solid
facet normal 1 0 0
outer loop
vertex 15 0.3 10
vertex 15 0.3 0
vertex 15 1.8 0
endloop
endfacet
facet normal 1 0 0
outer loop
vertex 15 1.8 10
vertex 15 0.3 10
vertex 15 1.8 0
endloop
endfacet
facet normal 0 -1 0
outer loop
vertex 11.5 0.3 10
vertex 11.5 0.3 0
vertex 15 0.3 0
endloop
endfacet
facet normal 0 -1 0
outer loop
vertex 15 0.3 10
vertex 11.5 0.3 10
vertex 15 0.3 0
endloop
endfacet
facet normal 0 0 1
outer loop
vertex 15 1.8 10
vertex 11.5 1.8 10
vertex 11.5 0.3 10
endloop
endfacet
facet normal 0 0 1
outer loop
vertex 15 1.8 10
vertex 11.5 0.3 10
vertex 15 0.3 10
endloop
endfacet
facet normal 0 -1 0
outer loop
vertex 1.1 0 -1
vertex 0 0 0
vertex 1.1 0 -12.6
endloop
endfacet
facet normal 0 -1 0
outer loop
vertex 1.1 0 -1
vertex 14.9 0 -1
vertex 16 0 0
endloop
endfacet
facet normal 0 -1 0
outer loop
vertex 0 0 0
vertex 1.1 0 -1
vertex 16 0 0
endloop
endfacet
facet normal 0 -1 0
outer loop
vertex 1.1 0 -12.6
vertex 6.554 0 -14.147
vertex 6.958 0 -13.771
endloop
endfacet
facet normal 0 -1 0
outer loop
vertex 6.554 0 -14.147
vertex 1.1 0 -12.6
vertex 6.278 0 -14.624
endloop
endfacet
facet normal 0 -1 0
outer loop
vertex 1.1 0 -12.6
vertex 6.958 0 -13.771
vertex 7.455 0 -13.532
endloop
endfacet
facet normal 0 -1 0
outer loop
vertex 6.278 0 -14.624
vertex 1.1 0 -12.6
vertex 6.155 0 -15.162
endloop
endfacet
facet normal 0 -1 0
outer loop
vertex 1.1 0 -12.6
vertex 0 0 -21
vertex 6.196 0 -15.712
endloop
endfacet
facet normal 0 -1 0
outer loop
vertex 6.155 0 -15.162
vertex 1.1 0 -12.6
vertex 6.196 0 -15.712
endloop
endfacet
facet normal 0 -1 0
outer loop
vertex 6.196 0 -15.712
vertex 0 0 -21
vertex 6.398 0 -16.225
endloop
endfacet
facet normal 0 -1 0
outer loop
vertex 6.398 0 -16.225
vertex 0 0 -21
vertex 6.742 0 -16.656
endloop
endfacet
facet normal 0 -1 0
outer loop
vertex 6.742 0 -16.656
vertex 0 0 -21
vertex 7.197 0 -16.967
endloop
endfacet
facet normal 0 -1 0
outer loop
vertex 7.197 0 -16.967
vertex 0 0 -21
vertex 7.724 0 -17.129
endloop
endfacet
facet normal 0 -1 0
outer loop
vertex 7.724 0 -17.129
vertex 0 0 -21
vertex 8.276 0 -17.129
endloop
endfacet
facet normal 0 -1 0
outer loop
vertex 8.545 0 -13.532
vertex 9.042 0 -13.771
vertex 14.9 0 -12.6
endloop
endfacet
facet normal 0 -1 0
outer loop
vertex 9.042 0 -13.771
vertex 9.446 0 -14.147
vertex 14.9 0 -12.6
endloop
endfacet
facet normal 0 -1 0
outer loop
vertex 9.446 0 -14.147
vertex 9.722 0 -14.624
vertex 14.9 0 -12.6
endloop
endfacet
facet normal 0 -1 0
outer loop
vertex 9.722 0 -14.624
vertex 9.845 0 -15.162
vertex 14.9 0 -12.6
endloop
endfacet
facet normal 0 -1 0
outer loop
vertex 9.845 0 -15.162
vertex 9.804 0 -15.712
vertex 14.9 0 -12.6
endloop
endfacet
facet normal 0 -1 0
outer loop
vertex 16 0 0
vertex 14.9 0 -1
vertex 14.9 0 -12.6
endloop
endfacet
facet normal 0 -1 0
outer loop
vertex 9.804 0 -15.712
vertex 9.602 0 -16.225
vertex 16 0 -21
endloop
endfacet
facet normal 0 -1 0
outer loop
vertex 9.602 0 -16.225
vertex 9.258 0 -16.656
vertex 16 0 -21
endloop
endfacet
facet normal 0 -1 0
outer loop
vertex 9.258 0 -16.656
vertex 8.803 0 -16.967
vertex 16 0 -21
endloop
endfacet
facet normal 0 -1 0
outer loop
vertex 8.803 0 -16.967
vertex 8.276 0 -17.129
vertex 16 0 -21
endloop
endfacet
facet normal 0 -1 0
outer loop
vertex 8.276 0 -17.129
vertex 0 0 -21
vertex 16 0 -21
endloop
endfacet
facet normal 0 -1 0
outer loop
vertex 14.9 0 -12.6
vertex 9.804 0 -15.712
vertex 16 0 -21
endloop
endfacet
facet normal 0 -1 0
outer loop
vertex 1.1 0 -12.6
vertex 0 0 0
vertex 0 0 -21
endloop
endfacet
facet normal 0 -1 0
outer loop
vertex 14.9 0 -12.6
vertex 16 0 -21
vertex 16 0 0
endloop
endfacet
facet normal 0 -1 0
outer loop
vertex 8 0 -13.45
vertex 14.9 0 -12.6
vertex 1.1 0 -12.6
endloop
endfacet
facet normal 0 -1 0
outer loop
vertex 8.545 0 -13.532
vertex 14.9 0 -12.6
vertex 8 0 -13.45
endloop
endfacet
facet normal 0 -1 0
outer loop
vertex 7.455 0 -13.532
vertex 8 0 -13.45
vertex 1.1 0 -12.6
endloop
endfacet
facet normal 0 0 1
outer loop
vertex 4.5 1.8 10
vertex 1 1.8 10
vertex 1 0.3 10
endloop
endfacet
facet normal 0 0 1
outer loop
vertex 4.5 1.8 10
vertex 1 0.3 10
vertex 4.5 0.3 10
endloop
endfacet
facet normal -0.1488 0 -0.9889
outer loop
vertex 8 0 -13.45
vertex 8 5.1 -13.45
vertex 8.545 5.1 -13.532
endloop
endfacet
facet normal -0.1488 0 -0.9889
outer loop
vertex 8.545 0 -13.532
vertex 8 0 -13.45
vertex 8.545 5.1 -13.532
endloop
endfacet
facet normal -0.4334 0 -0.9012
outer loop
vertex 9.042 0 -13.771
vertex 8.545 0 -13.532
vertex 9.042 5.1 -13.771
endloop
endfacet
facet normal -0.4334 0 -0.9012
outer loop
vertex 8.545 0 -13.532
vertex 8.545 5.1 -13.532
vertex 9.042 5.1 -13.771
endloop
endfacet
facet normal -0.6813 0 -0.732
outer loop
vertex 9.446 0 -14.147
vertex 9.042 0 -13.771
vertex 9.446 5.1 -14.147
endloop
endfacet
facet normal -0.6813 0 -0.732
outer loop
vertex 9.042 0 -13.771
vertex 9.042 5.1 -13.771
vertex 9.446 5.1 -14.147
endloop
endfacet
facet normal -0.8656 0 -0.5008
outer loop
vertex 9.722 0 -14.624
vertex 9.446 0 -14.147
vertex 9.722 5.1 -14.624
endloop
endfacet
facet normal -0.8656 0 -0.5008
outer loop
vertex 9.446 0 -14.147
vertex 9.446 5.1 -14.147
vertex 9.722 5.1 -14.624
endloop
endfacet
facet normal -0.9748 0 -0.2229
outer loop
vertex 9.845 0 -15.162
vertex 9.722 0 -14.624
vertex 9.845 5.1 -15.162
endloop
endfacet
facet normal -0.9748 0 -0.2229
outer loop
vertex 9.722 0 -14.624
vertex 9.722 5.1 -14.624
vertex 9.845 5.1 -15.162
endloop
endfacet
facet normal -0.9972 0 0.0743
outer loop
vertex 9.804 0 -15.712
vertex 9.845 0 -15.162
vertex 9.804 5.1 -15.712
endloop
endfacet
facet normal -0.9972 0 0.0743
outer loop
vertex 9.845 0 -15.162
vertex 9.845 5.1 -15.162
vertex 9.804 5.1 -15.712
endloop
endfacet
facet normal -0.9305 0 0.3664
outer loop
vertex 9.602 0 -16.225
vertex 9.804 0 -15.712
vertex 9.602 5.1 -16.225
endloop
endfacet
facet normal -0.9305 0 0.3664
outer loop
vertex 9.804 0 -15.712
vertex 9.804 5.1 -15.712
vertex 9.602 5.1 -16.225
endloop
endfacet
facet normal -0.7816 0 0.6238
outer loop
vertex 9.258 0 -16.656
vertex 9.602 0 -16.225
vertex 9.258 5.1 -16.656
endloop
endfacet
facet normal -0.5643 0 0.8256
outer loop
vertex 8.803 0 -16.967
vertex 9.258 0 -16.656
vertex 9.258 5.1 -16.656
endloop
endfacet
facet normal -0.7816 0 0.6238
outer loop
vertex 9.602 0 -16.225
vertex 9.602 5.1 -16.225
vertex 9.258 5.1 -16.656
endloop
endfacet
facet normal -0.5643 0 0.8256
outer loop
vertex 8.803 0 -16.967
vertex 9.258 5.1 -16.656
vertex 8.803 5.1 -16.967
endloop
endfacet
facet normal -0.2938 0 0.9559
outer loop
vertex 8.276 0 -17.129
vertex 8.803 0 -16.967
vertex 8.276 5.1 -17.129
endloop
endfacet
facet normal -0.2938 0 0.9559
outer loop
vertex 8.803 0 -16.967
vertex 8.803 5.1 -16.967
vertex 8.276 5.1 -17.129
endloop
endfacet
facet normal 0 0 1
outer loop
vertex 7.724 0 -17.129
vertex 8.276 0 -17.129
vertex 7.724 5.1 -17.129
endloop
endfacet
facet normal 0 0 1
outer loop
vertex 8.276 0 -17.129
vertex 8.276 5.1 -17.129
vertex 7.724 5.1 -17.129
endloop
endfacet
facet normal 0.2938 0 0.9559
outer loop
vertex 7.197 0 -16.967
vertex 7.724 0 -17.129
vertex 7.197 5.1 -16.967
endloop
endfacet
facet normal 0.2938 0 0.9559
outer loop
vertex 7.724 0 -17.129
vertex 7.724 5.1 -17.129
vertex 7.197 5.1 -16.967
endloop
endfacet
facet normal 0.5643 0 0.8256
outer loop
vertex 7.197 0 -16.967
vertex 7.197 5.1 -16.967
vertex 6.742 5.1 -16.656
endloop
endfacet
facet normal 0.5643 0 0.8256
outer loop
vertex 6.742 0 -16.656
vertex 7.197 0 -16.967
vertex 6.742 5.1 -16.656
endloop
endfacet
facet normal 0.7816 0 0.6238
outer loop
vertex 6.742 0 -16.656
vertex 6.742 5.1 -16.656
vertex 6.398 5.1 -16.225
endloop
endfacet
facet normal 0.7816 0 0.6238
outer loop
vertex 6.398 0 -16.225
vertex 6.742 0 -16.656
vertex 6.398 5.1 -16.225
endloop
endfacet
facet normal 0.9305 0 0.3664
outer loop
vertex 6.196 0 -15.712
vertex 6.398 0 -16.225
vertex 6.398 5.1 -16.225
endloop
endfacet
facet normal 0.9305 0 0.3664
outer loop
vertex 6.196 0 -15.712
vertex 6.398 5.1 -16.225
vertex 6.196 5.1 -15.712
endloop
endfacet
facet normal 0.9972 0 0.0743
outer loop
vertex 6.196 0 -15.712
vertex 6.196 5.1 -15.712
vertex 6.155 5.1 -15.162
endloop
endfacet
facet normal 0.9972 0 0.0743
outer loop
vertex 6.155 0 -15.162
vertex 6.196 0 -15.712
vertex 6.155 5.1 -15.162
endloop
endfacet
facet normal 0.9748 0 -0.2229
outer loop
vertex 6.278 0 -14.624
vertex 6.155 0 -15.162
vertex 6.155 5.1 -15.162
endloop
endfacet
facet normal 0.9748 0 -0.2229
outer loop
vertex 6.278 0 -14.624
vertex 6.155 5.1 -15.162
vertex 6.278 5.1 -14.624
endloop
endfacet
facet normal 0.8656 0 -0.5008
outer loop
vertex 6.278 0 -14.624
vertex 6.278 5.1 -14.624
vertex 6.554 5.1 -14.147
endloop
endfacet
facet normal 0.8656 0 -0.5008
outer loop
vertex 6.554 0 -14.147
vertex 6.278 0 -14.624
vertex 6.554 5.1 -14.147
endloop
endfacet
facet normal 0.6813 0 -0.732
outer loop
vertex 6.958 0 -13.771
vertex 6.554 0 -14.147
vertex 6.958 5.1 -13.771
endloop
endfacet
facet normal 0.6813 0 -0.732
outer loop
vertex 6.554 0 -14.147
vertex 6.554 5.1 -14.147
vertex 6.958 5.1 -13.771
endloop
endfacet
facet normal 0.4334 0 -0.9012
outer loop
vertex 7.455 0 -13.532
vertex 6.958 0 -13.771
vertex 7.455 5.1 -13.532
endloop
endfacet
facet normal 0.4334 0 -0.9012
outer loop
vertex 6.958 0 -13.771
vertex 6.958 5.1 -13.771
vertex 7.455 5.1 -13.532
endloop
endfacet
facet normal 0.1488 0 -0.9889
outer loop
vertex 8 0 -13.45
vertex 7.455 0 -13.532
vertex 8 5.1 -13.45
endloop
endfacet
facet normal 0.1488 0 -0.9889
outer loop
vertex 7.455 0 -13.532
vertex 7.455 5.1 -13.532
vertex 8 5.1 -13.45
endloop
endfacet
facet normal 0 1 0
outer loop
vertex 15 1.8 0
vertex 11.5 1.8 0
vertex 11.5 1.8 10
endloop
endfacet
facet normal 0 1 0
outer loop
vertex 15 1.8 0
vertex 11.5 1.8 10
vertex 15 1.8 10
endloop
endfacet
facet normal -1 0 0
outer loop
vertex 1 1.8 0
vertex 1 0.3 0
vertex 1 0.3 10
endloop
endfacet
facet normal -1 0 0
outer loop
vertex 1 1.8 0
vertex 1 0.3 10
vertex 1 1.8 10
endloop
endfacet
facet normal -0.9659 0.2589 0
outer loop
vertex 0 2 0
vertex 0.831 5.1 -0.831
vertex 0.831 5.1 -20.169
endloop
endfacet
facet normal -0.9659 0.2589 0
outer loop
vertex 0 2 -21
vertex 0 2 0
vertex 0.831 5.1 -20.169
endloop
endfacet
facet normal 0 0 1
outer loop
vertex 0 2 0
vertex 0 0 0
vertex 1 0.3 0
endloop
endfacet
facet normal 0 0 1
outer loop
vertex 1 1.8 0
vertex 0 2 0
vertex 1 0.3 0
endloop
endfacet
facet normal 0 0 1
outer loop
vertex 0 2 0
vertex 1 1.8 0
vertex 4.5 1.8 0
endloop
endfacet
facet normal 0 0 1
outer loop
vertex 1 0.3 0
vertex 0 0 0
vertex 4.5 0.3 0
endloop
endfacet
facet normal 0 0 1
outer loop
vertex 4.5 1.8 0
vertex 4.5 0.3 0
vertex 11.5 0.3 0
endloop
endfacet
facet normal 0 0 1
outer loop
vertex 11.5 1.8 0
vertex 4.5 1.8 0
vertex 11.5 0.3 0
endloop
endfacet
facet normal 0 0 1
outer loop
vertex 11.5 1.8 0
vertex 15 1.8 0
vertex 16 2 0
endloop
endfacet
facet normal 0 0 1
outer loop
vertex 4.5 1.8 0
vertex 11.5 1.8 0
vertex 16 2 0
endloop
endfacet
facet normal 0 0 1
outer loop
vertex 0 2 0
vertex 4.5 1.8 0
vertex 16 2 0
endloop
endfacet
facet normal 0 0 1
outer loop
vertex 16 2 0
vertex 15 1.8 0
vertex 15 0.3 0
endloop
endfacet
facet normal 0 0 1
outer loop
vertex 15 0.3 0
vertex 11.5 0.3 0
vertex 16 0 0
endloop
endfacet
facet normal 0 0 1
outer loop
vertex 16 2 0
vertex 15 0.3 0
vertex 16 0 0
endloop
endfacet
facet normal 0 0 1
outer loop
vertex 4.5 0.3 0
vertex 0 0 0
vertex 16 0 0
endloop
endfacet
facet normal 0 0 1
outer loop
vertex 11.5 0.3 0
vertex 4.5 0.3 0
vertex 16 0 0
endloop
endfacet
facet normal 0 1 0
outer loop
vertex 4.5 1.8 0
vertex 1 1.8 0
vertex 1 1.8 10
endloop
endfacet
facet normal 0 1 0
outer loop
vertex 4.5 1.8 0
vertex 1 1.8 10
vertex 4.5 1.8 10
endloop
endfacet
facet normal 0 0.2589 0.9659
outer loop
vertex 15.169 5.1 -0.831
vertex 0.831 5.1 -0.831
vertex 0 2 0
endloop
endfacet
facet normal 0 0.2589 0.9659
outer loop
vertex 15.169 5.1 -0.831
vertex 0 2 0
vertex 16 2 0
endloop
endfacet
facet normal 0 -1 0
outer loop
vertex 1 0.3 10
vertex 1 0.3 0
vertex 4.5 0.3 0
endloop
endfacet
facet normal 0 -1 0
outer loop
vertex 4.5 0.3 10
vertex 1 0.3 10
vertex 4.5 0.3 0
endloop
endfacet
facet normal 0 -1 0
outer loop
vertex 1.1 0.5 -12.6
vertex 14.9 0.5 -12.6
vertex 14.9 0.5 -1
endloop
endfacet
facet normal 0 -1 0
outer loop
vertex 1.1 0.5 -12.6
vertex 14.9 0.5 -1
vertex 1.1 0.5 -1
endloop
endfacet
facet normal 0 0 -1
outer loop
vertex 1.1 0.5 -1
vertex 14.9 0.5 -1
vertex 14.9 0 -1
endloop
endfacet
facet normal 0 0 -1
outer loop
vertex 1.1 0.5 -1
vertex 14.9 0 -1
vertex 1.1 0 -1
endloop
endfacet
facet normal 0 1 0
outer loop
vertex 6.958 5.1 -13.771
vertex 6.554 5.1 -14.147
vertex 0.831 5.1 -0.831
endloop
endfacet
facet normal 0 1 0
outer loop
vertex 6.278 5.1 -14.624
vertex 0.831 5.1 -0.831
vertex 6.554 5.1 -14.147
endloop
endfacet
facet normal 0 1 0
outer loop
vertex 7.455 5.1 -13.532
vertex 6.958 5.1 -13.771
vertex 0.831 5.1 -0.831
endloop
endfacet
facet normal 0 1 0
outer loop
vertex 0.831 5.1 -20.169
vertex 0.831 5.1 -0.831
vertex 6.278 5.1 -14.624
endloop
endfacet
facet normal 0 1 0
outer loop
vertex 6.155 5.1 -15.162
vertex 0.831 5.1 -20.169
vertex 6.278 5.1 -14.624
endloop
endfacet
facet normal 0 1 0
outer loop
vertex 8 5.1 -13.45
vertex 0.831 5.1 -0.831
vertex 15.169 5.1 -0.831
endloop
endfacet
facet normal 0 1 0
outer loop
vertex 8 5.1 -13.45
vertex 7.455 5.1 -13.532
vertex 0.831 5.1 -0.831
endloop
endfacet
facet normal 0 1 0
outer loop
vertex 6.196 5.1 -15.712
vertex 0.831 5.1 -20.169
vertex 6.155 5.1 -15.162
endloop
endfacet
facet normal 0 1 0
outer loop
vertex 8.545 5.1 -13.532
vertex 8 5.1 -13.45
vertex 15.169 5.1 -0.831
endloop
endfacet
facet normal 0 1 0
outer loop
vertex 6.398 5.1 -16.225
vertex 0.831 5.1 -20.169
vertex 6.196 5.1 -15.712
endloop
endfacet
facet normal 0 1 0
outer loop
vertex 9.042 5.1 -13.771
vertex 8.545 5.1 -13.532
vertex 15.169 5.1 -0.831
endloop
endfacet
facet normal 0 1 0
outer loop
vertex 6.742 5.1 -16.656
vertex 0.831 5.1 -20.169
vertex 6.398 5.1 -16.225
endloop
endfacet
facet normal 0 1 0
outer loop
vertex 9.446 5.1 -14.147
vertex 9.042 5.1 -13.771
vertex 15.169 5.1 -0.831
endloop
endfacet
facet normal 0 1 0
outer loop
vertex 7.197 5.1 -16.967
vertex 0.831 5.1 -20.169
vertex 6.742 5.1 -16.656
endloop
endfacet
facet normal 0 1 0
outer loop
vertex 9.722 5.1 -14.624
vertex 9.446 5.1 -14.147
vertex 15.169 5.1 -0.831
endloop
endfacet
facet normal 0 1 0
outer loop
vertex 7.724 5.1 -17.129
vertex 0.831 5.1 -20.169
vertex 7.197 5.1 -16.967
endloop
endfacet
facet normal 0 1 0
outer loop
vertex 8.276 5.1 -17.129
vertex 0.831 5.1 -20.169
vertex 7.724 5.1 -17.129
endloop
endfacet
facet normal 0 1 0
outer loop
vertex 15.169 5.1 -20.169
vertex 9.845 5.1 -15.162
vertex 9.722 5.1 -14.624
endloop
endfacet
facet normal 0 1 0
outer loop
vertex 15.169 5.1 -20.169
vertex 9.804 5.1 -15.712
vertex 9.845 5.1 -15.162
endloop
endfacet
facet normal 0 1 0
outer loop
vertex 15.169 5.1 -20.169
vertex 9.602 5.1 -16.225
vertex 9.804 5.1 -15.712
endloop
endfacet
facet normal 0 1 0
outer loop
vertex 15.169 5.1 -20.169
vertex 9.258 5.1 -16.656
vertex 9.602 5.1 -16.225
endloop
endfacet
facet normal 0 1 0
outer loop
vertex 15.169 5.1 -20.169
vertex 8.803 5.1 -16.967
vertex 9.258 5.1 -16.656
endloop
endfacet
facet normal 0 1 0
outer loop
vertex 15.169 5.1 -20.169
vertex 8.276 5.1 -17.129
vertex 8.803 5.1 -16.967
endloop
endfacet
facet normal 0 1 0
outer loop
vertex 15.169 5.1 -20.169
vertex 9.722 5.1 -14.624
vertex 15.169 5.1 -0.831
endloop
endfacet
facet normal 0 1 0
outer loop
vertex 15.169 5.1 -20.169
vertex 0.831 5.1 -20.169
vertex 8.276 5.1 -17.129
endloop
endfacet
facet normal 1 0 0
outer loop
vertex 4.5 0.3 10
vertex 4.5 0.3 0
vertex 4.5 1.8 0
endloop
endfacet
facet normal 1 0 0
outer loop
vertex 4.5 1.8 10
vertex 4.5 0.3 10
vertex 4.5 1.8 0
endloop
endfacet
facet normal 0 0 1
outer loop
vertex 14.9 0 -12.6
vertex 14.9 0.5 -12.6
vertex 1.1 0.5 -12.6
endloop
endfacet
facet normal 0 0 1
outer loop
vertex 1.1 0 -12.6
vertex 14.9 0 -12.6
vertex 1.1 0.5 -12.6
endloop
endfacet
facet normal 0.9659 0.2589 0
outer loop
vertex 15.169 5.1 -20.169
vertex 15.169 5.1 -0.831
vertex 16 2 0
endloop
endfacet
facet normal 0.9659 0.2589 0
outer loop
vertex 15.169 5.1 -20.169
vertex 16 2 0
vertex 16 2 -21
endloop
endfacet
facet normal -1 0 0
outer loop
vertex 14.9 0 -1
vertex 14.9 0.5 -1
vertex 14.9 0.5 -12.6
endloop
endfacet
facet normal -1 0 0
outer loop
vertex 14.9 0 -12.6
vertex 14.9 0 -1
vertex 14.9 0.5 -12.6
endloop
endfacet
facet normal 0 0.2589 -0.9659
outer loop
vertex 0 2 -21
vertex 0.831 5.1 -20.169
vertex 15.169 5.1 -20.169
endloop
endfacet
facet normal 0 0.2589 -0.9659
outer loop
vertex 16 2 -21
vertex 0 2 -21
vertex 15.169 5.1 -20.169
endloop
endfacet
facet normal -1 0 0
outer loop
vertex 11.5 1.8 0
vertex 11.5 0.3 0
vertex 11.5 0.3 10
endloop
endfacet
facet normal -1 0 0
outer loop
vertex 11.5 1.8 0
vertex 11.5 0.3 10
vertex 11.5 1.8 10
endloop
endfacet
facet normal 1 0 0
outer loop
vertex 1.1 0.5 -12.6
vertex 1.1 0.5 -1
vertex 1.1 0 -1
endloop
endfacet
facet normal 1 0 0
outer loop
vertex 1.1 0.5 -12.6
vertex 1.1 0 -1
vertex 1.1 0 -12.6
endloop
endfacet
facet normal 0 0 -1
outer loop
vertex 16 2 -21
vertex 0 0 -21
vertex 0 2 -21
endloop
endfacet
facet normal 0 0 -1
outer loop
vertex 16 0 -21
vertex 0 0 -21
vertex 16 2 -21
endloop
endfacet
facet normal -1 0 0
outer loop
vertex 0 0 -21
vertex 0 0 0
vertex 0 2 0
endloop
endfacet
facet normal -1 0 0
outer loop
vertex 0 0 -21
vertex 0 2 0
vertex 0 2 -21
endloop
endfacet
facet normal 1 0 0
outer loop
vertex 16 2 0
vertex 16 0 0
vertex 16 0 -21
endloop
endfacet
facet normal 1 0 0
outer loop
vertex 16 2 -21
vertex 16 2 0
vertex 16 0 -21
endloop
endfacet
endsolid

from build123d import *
from OCP.BRepFilletAPI import BRepFilletAPI_MakeChamfer

# Parameters (mm, degrees)
SKETCH1_W              = 16
SKETCH1_H              = 21
BOSS_EXTRUDE1_DEPTH    = 5.1
SKETCH2_R              = 1.85
CUT_EXTRUDE1_DEPTH     = 5.1
CHAMFER1_SIZE          = 3.1
CHAMFER1_SIZE2         = 0.830642497
SKETCH3_W              = 3.5
SKETCH3_H              = 1.5
BOSS_EXTRUDE2_DEPTH    = 10
CUT_EXTRUDE3_START     = -0.5
CUT_EXTRUDE3_OUTLINE_W = 13.8
CUT_EXTRUDE3_OUTLINE_H = 11.6
CUT_EXTRUDE3_DEPTH     = 0.5


# Read off the part's stored shape, not the designer's step: Cut-Extrude3
with BuildPart() as part:
    # Sketch1 → Boss-Extrude1 (new body)
    with BuildSketch(Plane(origin=(0, 0, 0), x_dir=(1, 0, 0), z_dir=(0, 1, 0))):
        with Locations((8, 10.5)):
            Rectangle(SKETCH1_W, SKETCH1_H)
    extrude(amount=BOSS_EXTRUDE1_DEPTH)

    # Sketch2 → Cut-Extrude1 (cut)
    with BuildSketch(Plane(origin=(0, 5.1, 0), x_dir=(1, 0, 0), z_dir=(0, 1, 0))):
        with Locations(Location((8, 15.3, 0), (0, 0, 270))):
            Circle(SKETCH2_R)
    extrude(amount=-CUT_EXTRUDE1_DEPTH, mode=Mode.SUBTRACT)

    # Chamfer1: one chamfer whose edges measure the first distance from different faces: ONE call of the kernel's chamfer builder (chamfer() names one face for all edges)
    chamfer1_edges_1 = [part.edges().sort_by_distance(p)[0] for p in [
        (16, 5.1, -10.5),
    ]]
    chamfer1_side_1 = [part.faces().sort_by_distance(p)[0] for p in [
        (16, 2.55, -10.5),
    ]]
    chamfer1_edges_2 = [part.edges().sort_by_distance(p)[0] for p in [
        (8, 5.1, -21),
    ]]
    chamfer1_side_2 = [part.faces().sort_by_distance(p)[0] for p in [
        (8, 2.55, -21),
    ]]
    chamfer1_edges_3 = [part.edges().sort_by_distance(p)[0] for p in [
        (0, 5.1, -10.5),
    ]]
    chamfer1_side_3 = [part.faces().sort_by_distance(p)[0] for p in [
        (0, 2.55, -10.5),
    ]]
    chamfer1_edges_4 = [part.edges().sort_by_distance(p)[0] for p in [
        (8, 5.1, 0),
    ]]
    chamfer1_side_4 = [part.faces().sort_by_distance(p)[0] for p in [
        (8, 2.55, 0),
    ]]
    chamfer1 = BRepFilletAPI_MakeChamfer(part.part.solid().wrapped)
    for e in chamfer1_edges_1:
        chamfer1.Add(CHAMFER1_SIZE, CHAMFER1_SIZE2, e.wrapped, chamfer1_side_1[0].wrapped)  # the first distance lies on this face
    for e in chamfer1_edges_2:
        chamfer1.Add(CHAMFER1_SIZE, CHAMFER1_SIZE2, e.wrapped, chamfer1_side_2[0].wrapped)  # the first distance lies on this face
    for e in chamfer1_edges_3:
        chamfer1.Add(CHAMFER1_SIZE, CHAMFER1_SIZE2, e.wrapped, chamfer1_side_3[0].wrapped)  # the first distance lies on this face
    for e in chamfer1_edges_4:
        chamfer1.Add(CHAMFER1_SIZE, CHAMFER1_SIZE2, e.wrapped, chamfer1_side_4[0].wrapped)  # the first distance lies on this face
    add(Compound.cast(chamfer1.Shape()), mode=Mode.REPLACE)

    # Sketch3 → Boss-Extrude2 (add)
    with BuildSketch(Plane.XY):
        with Locations((2.75, 1.05)):
            Rectangle(SKETCH3_W, SKETCH3_H)
        with Locations((13.25, 1.05)):
            Rectangle(SKETCH3_W, SKETCH3_H)
    extrude(amount=BOSS_EXTRUDE2_DEPTH)

    # Cut-Extrude3 outline → Cut-Extrude3 (cut)
    with BuildSketch(Plane(origin=(0, 0, 0), x_dir=(-1, 0, 0), z_dir=(0, -1, 0)).offset(CUT_EXTRUDE3_START)):
        with Locations((-8, 6.8)):
            Rectangle(CUT_EXTRUDE3_OUTLINE_W, CUT_EXTRUDE3_OUTLINE_H)
    extrude(amount=CUT_EXTRUDE3_DEPTH, mode=Mode.SUBTRACT)


solid = part.part
